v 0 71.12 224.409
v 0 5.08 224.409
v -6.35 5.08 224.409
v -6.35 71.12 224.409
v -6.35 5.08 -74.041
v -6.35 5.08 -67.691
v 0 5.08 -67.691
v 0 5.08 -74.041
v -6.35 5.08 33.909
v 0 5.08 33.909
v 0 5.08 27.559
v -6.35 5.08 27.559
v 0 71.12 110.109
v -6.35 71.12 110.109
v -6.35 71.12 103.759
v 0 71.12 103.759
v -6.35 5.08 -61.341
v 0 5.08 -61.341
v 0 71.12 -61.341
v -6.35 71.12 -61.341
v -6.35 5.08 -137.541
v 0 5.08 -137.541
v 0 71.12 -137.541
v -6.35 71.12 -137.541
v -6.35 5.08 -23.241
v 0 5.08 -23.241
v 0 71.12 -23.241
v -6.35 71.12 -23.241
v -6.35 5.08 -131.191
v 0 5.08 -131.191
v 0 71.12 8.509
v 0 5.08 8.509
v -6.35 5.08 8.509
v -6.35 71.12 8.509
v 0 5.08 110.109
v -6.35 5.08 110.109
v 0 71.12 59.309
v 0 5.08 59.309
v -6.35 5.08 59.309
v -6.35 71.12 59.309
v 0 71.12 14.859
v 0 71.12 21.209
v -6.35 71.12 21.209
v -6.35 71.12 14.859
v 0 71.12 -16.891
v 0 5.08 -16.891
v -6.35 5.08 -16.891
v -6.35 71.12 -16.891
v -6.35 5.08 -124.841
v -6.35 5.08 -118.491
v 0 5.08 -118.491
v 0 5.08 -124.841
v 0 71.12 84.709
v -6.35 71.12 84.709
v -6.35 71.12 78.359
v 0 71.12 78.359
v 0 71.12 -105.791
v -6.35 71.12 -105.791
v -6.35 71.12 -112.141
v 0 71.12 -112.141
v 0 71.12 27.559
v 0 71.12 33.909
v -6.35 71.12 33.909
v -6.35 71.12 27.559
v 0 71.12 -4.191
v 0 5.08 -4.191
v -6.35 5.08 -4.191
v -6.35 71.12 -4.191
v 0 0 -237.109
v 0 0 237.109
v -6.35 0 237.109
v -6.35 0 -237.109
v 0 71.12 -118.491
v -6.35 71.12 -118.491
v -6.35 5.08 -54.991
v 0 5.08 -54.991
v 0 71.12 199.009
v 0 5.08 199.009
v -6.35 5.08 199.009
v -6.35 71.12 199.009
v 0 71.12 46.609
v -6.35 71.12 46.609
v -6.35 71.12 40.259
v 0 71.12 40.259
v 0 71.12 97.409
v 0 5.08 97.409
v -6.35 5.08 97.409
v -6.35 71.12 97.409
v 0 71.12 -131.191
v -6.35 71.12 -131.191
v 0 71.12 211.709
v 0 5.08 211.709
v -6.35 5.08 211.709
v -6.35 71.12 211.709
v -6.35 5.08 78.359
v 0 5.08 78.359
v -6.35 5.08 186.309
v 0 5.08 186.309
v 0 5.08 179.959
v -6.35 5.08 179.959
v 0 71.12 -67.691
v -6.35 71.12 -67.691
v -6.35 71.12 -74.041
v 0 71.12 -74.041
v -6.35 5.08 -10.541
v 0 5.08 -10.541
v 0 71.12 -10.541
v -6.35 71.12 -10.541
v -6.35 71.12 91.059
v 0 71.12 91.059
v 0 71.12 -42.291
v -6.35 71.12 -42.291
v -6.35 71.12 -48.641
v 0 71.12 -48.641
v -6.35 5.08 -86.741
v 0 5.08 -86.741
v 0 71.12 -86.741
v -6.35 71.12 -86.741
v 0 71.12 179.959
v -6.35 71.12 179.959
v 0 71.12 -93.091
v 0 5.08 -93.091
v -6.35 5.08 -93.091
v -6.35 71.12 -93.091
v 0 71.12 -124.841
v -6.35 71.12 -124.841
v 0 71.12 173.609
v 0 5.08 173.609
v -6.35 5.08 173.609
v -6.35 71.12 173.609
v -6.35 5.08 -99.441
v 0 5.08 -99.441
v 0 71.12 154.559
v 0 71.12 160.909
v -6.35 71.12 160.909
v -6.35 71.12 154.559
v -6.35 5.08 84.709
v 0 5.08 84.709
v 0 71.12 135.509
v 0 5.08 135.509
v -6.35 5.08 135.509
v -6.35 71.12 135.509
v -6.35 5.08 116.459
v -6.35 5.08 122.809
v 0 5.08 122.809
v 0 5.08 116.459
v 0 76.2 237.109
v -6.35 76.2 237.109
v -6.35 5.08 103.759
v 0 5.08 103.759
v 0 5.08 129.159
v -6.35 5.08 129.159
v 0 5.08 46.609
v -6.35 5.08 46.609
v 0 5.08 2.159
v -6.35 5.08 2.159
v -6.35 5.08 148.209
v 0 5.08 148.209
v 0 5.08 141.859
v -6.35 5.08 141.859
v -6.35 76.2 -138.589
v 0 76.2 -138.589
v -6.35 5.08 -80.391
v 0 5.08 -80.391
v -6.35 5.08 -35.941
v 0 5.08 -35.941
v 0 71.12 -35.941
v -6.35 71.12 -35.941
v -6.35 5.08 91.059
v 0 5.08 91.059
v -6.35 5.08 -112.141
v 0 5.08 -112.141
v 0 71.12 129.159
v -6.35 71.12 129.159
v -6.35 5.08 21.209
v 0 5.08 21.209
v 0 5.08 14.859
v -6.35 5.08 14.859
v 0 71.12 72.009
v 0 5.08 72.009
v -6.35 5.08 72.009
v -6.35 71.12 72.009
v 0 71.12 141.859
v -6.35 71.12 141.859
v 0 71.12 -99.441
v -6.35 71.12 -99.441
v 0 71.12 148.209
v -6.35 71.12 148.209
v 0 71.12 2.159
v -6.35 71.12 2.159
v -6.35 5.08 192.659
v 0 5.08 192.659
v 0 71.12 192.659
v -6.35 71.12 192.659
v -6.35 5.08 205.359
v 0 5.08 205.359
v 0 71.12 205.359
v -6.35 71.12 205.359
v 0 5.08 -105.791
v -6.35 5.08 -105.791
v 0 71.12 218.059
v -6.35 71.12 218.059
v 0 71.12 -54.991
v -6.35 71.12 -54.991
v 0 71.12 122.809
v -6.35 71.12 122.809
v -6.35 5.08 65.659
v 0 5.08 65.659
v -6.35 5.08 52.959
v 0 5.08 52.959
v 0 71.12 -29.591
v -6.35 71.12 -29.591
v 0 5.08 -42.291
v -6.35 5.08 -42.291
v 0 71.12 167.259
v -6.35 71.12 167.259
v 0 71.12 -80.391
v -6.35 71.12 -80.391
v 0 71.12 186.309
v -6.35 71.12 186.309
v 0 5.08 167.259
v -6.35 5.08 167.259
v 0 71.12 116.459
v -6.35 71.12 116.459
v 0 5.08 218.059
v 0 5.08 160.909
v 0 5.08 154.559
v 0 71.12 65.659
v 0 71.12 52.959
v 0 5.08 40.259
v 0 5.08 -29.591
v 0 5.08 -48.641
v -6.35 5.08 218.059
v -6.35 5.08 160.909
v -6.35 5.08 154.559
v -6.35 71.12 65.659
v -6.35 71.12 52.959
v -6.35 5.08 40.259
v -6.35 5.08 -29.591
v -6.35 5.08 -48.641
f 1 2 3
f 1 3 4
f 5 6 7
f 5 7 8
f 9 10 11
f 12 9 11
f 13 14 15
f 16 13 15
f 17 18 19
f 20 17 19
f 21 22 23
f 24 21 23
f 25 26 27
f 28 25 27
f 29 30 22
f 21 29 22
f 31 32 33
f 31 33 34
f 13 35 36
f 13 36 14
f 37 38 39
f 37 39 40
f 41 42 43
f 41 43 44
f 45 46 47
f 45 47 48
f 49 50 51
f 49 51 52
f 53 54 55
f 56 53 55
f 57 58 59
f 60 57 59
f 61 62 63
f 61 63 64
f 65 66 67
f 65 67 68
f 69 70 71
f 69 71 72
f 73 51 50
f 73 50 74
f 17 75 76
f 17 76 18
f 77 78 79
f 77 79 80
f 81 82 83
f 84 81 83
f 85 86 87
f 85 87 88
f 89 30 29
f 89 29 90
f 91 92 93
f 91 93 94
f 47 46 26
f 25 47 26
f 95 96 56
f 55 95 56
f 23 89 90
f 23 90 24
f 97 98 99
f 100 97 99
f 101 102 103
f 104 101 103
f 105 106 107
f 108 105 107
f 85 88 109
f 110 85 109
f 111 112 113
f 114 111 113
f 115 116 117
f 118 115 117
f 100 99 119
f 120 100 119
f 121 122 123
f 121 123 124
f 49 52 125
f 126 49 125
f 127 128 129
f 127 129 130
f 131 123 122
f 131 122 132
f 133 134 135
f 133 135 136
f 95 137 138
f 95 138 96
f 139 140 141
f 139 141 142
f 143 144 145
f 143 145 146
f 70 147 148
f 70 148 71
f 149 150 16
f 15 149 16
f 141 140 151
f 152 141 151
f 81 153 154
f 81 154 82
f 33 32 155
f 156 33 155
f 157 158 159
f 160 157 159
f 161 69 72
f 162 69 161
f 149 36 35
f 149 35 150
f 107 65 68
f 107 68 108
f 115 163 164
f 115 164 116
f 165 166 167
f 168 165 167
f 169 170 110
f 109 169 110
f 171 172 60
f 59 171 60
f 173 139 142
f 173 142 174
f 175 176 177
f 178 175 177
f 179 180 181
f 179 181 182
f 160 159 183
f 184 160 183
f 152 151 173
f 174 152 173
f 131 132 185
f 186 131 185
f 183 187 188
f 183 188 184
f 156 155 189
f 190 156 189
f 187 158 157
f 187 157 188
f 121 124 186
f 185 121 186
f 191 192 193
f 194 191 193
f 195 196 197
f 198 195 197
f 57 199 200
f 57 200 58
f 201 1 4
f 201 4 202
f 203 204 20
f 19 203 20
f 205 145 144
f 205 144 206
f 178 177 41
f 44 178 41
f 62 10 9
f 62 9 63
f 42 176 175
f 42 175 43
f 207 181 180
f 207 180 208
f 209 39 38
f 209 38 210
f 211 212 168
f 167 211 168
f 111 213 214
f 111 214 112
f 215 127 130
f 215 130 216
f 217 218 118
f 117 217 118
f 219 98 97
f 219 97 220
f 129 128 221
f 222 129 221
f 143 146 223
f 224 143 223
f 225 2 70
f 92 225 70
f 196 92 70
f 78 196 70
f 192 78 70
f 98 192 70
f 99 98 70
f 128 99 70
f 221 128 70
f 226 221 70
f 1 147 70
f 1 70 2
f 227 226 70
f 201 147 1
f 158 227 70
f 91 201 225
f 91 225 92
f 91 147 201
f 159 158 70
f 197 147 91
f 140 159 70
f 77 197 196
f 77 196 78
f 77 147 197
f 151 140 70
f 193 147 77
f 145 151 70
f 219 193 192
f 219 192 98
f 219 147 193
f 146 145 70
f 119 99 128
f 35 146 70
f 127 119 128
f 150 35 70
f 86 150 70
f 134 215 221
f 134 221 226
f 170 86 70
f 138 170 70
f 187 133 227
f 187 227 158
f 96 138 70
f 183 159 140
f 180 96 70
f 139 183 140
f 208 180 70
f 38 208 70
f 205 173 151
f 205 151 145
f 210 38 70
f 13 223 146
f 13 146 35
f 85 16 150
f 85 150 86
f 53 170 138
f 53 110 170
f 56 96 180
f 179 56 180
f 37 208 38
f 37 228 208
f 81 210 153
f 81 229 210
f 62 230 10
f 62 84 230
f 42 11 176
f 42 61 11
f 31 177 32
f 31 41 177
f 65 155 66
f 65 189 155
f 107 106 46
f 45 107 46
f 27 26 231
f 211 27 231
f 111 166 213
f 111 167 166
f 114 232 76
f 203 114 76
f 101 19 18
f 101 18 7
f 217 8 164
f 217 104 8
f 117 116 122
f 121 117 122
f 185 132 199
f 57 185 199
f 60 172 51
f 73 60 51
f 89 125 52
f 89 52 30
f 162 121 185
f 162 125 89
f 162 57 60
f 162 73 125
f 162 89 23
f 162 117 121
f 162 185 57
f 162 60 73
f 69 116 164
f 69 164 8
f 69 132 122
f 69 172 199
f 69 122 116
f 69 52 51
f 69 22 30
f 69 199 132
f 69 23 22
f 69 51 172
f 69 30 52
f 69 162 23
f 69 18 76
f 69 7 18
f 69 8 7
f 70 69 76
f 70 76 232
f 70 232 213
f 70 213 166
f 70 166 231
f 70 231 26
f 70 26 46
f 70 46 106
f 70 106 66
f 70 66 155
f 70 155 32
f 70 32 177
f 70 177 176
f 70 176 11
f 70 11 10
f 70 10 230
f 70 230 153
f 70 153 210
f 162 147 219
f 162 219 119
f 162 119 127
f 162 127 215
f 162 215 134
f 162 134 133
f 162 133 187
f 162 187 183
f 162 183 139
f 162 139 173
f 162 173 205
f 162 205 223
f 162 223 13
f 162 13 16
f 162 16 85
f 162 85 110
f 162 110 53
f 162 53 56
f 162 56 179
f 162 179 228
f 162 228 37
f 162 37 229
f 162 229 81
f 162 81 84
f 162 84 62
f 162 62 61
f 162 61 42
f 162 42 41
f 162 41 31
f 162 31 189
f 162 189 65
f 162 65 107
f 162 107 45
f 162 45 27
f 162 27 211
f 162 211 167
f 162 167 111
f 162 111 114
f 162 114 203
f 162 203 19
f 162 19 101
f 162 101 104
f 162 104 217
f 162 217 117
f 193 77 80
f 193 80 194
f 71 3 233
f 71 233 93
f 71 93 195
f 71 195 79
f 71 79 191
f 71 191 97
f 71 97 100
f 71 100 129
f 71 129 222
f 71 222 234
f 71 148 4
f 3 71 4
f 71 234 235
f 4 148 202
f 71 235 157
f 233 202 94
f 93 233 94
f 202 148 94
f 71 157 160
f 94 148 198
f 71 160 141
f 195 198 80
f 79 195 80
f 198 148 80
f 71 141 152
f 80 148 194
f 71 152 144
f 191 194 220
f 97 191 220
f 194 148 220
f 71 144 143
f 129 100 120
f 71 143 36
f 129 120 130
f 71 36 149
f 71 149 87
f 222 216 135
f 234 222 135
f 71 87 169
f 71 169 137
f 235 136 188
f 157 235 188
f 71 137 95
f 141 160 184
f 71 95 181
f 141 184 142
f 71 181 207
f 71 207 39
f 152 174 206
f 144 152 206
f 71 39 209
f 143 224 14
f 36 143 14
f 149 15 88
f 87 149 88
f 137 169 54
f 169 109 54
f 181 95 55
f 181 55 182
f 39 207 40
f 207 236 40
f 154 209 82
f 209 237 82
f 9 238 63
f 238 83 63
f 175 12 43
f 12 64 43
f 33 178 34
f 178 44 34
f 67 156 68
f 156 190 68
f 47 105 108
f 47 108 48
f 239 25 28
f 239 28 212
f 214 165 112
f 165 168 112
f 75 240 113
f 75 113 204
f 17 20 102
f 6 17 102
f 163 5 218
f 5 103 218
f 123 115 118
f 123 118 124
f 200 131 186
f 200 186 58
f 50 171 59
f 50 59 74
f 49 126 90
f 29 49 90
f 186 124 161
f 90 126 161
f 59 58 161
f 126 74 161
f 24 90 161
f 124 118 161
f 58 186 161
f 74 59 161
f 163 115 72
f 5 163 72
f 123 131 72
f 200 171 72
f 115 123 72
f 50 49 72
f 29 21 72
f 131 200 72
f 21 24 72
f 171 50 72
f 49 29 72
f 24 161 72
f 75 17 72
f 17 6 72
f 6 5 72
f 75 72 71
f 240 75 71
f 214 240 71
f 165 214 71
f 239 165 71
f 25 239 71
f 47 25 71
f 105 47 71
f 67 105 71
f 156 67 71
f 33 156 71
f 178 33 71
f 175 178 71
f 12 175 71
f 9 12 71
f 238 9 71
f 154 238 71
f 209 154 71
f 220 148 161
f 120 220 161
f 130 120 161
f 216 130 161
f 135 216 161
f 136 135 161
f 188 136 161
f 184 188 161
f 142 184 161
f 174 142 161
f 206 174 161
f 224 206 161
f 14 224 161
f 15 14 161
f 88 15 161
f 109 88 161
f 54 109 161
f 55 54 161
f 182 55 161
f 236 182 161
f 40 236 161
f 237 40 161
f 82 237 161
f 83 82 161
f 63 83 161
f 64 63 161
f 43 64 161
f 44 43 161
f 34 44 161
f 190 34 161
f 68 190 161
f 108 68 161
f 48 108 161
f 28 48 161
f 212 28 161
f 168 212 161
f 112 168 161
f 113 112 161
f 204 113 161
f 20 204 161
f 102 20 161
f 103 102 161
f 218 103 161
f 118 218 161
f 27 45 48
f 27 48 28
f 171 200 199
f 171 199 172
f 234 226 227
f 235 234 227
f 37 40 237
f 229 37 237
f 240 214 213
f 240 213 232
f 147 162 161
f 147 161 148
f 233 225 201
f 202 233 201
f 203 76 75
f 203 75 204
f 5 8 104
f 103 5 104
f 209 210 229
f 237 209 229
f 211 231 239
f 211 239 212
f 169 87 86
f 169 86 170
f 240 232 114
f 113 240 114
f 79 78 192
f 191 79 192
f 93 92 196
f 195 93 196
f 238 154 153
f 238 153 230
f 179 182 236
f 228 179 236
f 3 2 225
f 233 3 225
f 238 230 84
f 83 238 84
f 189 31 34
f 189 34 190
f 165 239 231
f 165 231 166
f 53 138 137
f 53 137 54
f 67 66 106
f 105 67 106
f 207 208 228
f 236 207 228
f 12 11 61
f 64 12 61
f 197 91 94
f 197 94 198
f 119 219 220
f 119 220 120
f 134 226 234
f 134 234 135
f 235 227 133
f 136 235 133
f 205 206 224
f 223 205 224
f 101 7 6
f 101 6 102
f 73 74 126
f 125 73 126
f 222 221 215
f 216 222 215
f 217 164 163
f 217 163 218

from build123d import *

# Parameters (mm, degrees)
SKETCH1_W           = 6.35
SKETCH1_H           = 66.04
BOSS_EXTRUDE1_DEPTH = 6.35


with BuildPart() as part:
    # Sketch1 → Boss-Extrude1 (new body)
    with BuildSketch(Plane(origin=(0, 0, 0), x_dir=(0, 0, -1), z_dir=(1, 0, 0))):
        Polygon((-237.109, 0), (237.109, 0), (138.588815033, 76.2), (-237.109, 76.2), align=None)
        with Locations((-208.534, 38.1)):
            Rectangle(SKETCH1_W, SKETCH1_H, mode=Mode.SUBTRACT)
        with Locations((-221.234, 38.1)):
            Rectangle(SKETCH1_W, SKETCH1_H, mode=Mode.SUBTRACT)
        with Locations((-195.834, 38.1)):
            Rectangle(SKETCH1_W, SKETCH1_H, mode=Mode.SUBTRACT)
        with Locations((-183.134, 38.1)):
            Rectangle(SKETCH1_W, SKETCH1_H, mode=Mode.SUBTRACT)
        with Locations((-170.434, 38.1)):
            Rectangle(SKETCH1_W, SKETCH1_H, mode=Mode.SUBTRACT)
        with Locations((-157.734, 38.1)):
            Rectangle(SKETCH1_W, SKETCH1_H, mode=Mode.SUBTRACT)
        with Locations((-145.034, 38.1)):
            Rectangle(SKETCH1_W, SKETCH1_H, mode=Mode.SUBTRACT)
        with Locations((-132.334, 38.1)):
            Rectangle(SKETCH1_W, SKETCH1_H, mode=Mode.SUBTRACT)
        with Locations((-119.634, 38.1)):
            Rectangle(SKETCH1_W, SKETCH1_H, mode=Mode.SUBTRACT)
        with Locations((-106.934, 38.1)):
            Rectangle(SKETCH1_W, SKETCH1_H, mode=Mode.SUBTRACT)
        with Locations((-94.234, 38.1)):
            Rectangle(SKETCH1_W, SKETCH1_H, mode=Mode.SUBTRACT)
        with Locations((-81.534, 38.1)):
            Rectangle(SKETCH1_W, SKETCH1_H, mode=Mode.SUBTRACT)
        with Locations((-68.834, 38.1)):
            Rectangle(SKETCH1_W, SKETCH1_H, mode=Mode.SUBTRACT)
        with Locations((-56.134, 38.1)):
            Rectangle(SKETCH1_W, SKETCH1_H, mode=Mode.SUBTRACT)
        with Locations((-43.434, 38.1)):
            Rectangle(SKETCH1_W, SKETCH1_H, mode=Mode.SUBTRACT)
        with Locations((-30.734, 38.1)):
            Rectangle(SKETCH1_W, SKETCH1_H, mode=Mode.SUBTRACT)
        with Locations((-18.034, 38.1)):
            Rectangle(SKETCH1_W, SKETCH1_H, mode=Mode.SUBTRACT)
        with Locations((-5.334, 38.1)):
            Rectangle(SKETCH1_W, SKETCH1_H, mode=Mode.SUBTRACT)
        with Locations((7.366, 38.1)):
            Rectangle(SKETCH1_W, SKETCH1_H, mode=Mode.SUBTRACT)
        with Locations((20.066, 38.1)):
            Rectangle(SKETCH1_W, SKETCH1_H, mode=Mode.SUBTRACT)
        with Locations((32.766, 38.1)):
            Rectangle(SKETCH1_W, SKETCH1_H, mode=Mode.SUBTRACT)
        with Locations((45.466, 38.1)):
            Rectangle(SKETCH1_W, SKETCH1_H, mode=Mode.SUBTRACT)
        with Locations((58.166, 38.1)):
            Rectangle(SKETCH1_W, SKETCH1_H, mode=Mode.SUBTRACT)
        with Locations((70.866, 38.1)):
            Rectangle(SKETCH1_W, SKETCH1_H, mode=Mode.SUBTRACT)
        with Locations((83.566, 38.1)):
            Rectangle(SKETCH1_W, SKETCH1_H, mode=Mode.SUBTRACT)
        with Locations((96.266, 38.1)):
            Rectangle(SKETCH1_W, SKETCH1_H, mode=Mode.SUBTRACT)
        with Locations((108.966, 38.1)):
            Rectangle(SKETCH1_W, SKETCH1_H, mode=Mode.SUBTRACT)
        with Locations((121.666, 38.1)):
            Rectangle(SKETCH1_W, SKETCH1_H, mode=Mode.SUBTRACT)
        with Locations((134.366, 38.1)):
            Rectangle(SKETCH1_W, SKETCH1_H, mode=Mode.SUBTRACT)
    extrude(amount=-BOSS_EXTRUDE1_DEPTH)


solid = part.part
